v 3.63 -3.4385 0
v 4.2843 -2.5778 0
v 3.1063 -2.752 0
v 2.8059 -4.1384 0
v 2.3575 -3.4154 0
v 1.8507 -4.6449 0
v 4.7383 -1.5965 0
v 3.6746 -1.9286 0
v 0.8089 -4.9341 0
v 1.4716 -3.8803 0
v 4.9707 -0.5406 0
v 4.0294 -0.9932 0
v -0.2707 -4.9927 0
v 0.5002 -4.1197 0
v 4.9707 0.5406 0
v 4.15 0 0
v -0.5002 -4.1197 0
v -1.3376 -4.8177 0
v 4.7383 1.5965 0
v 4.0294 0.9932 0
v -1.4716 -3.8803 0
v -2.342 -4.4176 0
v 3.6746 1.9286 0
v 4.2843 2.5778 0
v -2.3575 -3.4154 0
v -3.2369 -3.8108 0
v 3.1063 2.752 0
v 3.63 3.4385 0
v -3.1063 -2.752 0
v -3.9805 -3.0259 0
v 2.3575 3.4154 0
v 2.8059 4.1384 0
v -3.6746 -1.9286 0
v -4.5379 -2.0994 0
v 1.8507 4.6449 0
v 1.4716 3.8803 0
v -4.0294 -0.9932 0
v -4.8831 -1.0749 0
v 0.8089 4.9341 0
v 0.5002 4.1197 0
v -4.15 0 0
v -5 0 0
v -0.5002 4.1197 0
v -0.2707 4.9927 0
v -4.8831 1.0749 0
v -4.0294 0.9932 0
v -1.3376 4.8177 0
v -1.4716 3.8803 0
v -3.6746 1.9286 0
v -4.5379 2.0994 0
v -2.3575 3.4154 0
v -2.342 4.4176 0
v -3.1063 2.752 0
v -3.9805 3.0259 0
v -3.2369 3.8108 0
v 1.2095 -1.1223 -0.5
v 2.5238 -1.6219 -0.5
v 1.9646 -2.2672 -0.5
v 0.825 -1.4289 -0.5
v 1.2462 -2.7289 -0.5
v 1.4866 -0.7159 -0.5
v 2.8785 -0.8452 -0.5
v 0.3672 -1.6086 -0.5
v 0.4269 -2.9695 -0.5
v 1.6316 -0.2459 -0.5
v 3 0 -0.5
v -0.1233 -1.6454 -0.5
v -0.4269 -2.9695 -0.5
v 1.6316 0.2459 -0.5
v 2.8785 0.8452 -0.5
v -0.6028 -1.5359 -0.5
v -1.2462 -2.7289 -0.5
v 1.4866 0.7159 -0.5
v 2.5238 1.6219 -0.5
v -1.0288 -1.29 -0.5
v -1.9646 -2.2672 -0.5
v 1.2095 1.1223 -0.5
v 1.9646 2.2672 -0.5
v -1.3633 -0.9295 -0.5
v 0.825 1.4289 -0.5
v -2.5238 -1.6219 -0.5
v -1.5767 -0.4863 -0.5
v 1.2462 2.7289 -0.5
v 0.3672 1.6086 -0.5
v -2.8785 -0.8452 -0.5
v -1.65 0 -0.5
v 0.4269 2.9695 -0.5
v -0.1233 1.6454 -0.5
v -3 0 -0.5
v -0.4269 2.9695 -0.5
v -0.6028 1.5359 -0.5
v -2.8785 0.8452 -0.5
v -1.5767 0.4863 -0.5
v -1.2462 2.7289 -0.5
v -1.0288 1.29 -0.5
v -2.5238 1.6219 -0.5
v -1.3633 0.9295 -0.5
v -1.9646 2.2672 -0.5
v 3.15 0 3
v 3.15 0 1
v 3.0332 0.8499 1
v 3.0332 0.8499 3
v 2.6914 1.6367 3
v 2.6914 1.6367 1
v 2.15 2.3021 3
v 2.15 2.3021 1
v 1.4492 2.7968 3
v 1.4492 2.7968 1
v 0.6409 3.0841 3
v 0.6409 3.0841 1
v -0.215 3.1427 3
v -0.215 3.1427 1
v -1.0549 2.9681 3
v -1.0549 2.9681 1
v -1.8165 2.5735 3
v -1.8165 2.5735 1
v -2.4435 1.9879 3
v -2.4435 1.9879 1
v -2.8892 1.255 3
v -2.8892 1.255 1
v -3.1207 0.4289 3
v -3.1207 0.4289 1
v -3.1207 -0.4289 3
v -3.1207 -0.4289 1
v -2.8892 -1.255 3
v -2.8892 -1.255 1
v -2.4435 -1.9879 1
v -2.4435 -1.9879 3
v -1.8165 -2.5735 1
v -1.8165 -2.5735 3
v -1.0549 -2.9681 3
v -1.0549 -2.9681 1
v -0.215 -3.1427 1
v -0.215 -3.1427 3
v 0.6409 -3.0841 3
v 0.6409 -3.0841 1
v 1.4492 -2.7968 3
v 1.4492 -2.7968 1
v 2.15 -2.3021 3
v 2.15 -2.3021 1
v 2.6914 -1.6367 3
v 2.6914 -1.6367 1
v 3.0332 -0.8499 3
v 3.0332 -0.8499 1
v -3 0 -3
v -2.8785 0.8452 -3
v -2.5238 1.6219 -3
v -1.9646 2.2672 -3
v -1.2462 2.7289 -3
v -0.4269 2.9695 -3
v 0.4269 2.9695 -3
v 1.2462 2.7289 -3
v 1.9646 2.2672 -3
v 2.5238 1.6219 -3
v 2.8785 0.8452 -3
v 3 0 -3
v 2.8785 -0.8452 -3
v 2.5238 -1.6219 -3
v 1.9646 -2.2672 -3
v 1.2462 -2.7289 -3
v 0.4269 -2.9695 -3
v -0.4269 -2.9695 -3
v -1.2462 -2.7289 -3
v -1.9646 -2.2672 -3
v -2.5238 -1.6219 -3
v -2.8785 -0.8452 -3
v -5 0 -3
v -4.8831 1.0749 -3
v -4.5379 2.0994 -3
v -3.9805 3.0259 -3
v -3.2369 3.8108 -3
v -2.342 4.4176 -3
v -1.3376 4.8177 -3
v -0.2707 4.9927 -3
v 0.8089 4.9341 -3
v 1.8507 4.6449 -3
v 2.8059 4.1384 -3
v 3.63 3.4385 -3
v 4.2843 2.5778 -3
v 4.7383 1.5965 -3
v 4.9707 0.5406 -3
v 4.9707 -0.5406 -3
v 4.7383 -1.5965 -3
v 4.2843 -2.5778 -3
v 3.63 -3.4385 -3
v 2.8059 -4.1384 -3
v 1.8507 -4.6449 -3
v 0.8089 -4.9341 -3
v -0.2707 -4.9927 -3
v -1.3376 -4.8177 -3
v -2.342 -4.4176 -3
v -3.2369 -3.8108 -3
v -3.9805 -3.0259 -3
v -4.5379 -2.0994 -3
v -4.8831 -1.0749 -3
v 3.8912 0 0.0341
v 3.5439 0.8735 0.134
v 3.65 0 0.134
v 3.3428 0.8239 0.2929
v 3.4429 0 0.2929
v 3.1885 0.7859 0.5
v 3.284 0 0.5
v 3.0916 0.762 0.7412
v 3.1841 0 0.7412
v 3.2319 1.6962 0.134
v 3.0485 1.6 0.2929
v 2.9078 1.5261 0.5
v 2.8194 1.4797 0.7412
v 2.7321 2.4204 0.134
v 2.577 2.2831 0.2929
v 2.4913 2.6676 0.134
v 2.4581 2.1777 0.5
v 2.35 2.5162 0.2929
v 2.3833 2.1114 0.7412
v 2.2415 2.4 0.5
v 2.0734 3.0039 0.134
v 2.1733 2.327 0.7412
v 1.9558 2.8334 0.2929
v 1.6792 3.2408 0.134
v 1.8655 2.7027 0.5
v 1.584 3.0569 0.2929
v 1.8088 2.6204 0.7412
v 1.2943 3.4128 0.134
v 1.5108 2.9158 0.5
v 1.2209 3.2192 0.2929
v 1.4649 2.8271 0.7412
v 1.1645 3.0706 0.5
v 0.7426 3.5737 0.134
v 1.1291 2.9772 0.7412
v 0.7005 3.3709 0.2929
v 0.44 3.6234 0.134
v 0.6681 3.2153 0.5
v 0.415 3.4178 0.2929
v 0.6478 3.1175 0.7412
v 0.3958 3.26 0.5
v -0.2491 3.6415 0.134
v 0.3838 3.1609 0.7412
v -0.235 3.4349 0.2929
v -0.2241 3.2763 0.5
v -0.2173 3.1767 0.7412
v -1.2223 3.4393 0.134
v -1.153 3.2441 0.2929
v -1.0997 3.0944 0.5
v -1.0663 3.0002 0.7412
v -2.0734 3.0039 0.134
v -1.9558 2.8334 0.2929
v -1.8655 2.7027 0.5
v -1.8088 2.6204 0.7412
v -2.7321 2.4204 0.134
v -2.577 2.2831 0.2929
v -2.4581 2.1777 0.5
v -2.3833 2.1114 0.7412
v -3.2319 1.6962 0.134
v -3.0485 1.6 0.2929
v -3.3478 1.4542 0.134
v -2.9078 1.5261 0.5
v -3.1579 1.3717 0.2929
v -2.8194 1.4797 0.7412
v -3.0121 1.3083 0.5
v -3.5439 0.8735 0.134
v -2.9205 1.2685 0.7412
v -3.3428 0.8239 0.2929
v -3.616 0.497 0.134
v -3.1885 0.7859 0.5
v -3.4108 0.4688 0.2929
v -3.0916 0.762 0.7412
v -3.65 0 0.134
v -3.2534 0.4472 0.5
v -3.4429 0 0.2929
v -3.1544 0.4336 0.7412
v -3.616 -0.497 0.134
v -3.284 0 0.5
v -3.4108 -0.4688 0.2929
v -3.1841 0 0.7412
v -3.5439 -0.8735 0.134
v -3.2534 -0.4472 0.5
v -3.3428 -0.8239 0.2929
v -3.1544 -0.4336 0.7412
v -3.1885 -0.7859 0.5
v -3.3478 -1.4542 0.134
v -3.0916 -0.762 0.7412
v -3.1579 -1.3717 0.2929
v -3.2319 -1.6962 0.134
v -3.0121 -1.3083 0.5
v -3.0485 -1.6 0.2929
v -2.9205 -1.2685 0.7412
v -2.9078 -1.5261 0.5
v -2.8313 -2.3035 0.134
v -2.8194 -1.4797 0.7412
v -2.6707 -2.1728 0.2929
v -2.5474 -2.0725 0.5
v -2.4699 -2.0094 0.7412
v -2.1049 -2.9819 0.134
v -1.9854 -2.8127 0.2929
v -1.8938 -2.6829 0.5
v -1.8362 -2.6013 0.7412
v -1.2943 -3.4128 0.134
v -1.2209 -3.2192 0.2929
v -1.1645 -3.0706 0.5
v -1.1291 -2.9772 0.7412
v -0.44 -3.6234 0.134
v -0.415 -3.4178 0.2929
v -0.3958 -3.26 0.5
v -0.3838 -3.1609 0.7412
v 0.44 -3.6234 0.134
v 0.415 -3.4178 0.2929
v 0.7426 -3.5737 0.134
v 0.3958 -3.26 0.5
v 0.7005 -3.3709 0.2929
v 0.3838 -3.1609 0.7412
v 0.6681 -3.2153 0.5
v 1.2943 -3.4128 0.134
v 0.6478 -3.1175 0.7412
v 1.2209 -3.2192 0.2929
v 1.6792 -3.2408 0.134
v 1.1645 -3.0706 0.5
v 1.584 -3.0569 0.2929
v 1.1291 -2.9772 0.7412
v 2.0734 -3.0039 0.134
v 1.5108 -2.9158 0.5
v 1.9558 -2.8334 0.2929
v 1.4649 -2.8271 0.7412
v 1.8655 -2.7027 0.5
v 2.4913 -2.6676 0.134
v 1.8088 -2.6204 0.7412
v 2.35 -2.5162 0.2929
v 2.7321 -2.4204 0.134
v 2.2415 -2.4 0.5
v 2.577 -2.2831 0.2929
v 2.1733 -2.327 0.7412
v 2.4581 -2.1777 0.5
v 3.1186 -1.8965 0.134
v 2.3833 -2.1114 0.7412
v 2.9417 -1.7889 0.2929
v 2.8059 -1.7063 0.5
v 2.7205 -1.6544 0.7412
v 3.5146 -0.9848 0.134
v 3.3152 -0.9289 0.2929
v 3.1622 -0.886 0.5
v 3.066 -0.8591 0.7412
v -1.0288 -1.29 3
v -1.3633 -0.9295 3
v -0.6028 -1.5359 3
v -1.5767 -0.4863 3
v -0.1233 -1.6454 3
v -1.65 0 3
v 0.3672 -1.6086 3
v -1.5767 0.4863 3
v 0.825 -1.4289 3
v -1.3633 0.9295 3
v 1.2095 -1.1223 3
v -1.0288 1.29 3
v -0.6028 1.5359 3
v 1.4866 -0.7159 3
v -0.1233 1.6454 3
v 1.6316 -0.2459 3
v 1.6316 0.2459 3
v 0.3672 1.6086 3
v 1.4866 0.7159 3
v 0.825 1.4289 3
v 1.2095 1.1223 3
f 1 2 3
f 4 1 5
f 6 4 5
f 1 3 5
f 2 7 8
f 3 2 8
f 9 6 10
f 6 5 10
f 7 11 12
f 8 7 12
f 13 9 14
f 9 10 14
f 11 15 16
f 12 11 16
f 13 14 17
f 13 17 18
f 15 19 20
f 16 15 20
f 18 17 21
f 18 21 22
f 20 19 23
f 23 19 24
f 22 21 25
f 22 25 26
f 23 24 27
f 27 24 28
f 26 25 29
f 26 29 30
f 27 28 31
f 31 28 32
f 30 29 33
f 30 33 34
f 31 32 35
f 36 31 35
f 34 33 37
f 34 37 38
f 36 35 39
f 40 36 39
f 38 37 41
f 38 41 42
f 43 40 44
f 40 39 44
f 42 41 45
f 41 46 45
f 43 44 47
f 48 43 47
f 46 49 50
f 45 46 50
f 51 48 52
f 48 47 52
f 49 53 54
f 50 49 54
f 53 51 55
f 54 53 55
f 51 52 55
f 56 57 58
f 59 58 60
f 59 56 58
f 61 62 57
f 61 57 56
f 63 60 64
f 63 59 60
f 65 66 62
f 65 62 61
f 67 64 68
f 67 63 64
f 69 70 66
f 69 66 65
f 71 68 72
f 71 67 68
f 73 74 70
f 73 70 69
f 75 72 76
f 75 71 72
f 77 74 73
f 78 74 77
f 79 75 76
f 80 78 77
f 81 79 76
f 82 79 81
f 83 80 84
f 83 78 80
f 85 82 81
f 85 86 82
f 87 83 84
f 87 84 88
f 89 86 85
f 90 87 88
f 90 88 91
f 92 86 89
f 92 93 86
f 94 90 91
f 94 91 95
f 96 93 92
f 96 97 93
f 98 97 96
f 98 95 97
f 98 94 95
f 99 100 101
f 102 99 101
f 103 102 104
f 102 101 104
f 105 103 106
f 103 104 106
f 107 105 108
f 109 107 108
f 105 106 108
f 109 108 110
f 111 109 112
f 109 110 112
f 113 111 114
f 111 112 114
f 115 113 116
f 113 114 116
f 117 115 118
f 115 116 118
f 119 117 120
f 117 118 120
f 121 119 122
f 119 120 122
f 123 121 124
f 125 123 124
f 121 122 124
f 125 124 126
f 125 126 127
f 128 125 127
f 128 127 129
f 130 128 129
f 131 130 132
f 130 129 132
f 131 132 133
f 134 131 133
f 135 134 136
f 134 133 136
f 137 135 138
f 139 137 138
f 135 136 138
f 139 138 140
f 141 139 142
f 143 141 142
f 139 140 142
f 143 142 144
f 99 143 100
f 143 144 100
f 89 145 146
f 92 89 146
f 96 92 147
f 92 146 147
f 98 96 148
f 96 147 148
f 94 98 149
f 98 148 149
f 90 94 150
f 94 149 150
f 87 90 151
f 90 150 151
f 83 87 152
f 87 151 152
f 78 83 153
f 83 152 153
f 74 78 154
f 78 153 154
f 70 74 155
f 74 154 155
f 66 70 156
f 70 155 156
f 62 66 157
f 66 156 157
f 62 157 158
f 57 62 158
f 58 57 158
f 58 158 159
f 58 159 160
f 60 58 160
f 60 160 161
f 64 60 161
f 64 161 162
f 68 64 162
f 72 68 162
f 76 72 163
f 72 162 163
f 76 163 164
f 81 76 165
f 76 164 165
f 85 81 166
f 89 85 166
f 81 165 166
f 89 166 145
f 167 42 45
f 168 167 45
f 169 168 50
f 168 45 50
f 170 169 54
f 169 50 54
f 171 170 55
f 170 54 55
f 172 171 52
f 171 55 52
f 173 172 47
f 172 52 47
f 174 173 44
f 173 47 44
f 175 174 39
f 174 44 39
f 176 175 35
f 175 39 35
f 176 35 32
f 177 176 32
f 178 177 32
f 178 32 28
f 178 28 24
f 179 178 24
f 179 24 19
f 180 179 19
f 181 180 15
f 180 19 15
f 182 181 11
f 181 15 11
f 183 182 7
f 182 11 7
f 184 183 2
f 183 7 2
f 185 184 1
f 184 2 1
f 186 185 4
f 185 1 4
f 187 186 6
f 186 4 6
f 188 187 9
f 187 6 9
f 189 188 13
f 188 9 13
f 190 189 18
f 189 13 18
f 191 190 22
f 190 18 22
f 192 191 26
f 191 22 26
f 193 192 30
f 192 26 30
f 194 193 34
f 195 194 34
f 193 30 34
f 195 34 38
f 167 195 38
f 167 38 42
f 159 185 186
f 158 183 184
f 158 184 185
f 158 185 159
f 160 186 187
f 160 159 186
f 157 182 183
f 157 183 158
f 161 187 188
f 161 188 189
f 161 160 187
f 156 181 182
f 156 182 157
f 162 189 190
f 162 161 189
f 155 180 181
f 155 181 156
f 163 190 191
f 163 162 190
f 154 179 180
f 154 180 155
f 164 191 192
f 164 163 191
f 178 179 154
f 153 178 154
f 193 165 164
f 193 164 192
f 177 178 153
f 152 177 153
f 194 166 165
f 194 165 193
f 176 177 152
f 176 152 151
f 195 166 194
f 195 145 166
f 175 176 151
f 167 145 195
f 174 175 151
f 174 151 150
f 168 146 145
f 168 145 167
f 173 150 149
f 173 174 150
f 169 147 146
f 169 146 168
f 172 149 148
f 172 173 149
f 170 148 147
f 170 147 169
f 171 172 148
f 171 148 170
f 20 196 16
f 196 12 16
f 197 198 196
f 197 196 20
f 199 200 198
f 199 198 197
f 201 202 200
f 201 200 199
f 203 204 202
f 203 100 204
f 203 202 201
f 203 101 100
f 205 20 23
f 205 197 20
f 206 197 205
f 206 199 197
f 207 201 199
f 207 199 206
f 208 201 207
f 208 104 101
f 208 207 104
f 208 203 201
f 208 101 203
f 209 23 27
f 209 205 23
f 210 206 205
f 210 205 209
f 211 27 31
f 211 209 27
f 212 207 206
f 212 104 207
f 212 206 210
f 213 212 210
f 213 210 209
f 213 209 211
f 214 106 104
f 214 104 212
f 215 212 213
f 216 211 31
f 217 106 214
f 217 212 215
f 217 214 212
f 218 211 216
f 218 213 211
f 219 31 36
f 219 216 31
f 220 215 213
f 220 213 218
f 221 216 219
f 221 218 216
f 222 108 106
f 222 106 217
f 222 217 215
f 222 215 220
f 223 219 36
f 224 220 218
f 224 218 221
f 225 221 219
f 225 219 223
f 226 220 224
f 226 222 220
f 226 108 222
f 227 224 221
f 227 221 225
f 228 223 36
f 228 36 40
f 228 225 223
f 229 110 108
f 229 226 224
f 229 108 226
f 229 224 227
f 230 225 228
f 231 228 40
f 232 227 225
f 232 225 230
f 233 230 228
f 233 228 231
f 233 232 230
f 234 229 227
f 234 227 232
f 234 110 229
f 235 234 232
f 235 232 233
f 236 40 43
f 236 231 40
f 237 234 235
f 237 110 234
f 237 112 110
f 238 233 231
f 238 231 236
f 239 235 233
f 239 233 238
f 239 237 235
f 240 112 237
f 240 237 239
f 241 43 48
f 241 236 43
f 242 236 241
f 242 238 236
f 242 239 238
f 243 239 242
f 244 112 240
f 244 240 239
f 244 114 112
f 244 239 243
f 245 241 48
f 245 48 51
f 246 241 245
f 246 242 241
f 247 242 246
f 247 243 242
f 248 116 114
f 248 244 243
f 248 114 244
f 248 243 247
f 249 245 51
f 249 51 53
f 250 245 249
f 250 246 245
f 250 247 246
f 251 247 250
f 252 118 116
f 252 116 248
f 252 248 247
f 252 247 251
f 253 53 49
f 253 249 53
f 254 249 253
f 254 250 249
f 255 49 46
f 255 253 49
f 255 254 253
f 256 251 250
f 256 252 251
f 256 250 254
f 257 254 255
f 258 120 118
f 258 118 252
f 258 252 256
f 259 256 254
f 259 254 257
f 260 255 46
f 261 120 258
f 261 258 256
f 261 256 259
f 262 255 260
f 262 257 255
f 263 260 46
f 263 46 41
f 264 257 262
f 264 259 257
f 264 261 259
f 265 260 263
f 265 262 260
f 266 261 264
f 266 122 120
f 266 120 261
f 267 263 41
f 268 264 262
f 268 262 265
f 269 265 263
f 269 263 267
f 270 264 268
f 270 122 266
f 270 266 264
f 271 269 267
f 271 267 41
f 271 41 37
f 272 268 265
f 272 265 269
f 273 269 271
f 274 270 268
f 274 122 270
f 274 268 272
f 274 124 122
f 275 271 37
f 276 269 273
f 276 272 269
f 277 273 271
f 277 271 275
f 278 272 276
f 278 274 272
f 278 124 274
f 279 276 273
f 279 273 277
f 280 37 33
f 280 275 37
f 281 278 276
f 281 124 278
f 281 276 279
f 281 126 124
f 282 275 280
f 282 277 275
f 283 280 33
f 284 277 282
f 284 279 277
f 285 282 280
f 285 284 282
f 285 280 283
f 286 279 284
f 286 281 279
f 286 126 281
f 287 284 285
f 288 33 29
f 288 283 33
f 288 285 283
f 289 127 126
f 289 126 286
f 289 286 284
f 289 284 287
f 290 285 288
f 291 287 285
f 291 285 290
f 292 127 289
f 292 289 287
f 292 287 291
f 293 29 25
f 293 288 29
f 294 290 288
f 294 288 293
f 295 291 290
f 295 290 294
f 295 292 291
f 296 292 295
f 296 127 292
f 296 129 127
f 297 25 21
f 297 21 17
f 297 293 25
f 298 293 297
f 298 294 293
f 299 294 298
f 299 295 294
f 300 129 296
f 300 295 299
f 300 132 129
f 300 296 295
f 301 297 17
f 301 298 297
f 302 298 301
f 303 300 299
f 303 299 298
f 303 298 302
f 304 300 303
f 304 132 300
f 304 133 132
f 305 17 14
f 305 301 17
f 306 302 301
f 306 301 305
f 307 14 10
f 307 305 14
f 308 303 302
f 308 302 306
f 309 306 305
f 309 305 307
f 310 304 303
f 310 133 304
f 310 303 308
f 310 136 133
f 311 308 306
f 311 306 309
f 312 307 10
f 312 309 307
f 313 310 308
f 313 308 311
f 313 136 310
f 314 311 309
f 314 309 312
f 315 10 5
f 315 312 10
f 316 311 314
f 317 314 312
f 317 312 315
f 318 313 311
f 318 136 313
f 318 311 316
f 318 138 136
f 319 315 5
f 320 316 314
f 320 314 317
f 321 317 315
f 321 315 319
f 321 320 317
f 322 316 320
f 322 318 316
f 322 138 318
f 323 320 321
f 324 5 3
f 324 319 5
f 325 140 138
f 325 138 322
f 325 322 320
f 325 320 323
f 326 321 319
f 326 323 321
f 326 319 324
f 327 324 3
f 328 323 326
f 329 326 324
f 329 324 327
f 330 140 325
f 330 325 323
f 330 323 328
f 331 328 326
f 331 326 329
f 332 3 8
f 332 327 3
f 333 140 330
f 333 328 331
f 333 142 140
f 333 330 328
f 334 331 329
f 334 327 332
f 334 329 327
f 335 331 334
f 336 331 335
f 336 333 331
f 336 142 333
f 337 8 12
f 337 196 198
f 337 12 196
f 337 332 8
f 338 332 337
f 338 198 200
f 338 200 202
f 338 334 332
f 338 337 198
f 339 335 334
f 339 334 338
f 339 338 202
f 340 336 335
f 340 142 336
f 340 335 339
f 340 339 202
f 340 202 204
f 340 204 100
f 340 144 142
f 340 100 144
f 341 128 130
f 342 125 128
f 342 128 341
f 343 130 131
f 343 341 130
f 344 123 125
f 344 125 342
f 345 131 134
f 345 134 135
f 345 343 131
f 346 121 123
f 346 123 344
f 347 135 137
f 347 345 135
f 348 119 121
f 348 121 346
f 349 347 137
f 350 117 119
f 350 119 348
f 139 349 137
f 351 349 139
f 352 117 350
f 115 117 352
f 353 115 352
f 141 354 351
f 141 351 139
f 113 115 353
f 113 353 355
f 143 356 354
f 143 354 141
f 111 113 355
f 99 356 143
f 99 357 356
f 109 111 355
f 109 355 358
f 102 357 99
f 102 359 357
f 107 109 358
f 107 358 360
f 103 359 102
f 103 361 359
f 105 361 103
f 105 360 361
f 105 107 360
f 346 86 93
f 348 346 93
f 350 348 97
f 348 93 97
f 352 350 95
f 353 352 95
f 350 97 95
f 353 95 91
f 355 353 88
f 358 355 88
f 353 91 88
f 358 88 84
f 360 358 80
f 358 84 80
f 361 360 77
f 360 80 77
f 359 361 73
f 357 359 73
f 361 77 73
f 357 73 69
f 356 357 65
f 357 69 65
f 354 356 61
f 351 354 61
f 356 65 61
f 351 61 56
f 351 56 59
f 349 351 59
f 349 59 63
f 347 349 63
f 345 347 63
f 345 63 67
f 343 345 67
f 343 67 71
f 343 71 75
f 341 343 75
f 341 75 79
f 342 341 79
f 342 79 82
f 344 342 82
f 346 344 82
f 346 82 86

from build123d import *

# Parameters (mm, degrees)
SKETCH1_R           = 3.15
BOSS_EXTRUDE1_DEPTH = 3
SKETCH2_R           = 5
BOSS_EXTRUDE2_DEPTH = 3
FILLET1_R           = 1
CUT_EXTRUDE1_REACH  = 11.274
SKETCH3_R           = 1.65
SKETCH4_R           = 3
CUT_EXTRUDE2_DEPTH  = 2.5


with BuildPart() as part:
    # Sketch1 → Boss-Extrude1 (new body)
    with BuildSketch(Plane.XY):
        Circle(SKETCH1_R)
    extrude(amount=BOSS_EXTRUDE1_DEPTH)

    # Sketch2 → Boss-Extrude2 (add)
    with BuildSketch(Plane(origin=(0, 0, 0), x_dir=(-1, 0, 0), z_dir=(0, 0, -1))):
        Circle(SKETCH2_R)
    extrude(amount=BOSS_EXTRUDE2_DEPTH)

    # Fillet1
    fillet1_edges = [part.edges().sort_by_distance(p)[0] for p in [
        (-3.15, 0, 0),
    ]]
    fillet(fillet1_edges, radius=FILLET1_R)

    # Sketch3 → Cut-Extrude1 (cut, up to next)
    with BuildSketch(Plane(origin=(0, 0, -3), x_dir=(-1, 0, 0), z_dir=(0, 0, -1)), mode=Mode.PRIVATE) as cut_extrude1_sk1:
        Circle(SKETCH3_R)
    cut_extrude1_tool1 = extrude(cut_extrude1_sk1.sketch, amount=-CUT_EXTRUDE1_REACH, mode=Mode.PRIVATE) & part.part
    add(cut_extrude1_tool1.solids().sort_by_distance((0, 0, -3))[0], mode=Mode.SUBTRACT)

    # Sketch4 → Cut-Extrude2 (cut)
    with BuildSketch(Plane(origin=(0, 0, -3), x_dir=(-1, 0, 0), z_dir=(0, 0, -1))):
        Circle(SKETCH4_R)
    extrude(amount=-CUT_EXTRUDE2_DEPTH, mode=Mode.SUBTRACT)


solid = part.part
